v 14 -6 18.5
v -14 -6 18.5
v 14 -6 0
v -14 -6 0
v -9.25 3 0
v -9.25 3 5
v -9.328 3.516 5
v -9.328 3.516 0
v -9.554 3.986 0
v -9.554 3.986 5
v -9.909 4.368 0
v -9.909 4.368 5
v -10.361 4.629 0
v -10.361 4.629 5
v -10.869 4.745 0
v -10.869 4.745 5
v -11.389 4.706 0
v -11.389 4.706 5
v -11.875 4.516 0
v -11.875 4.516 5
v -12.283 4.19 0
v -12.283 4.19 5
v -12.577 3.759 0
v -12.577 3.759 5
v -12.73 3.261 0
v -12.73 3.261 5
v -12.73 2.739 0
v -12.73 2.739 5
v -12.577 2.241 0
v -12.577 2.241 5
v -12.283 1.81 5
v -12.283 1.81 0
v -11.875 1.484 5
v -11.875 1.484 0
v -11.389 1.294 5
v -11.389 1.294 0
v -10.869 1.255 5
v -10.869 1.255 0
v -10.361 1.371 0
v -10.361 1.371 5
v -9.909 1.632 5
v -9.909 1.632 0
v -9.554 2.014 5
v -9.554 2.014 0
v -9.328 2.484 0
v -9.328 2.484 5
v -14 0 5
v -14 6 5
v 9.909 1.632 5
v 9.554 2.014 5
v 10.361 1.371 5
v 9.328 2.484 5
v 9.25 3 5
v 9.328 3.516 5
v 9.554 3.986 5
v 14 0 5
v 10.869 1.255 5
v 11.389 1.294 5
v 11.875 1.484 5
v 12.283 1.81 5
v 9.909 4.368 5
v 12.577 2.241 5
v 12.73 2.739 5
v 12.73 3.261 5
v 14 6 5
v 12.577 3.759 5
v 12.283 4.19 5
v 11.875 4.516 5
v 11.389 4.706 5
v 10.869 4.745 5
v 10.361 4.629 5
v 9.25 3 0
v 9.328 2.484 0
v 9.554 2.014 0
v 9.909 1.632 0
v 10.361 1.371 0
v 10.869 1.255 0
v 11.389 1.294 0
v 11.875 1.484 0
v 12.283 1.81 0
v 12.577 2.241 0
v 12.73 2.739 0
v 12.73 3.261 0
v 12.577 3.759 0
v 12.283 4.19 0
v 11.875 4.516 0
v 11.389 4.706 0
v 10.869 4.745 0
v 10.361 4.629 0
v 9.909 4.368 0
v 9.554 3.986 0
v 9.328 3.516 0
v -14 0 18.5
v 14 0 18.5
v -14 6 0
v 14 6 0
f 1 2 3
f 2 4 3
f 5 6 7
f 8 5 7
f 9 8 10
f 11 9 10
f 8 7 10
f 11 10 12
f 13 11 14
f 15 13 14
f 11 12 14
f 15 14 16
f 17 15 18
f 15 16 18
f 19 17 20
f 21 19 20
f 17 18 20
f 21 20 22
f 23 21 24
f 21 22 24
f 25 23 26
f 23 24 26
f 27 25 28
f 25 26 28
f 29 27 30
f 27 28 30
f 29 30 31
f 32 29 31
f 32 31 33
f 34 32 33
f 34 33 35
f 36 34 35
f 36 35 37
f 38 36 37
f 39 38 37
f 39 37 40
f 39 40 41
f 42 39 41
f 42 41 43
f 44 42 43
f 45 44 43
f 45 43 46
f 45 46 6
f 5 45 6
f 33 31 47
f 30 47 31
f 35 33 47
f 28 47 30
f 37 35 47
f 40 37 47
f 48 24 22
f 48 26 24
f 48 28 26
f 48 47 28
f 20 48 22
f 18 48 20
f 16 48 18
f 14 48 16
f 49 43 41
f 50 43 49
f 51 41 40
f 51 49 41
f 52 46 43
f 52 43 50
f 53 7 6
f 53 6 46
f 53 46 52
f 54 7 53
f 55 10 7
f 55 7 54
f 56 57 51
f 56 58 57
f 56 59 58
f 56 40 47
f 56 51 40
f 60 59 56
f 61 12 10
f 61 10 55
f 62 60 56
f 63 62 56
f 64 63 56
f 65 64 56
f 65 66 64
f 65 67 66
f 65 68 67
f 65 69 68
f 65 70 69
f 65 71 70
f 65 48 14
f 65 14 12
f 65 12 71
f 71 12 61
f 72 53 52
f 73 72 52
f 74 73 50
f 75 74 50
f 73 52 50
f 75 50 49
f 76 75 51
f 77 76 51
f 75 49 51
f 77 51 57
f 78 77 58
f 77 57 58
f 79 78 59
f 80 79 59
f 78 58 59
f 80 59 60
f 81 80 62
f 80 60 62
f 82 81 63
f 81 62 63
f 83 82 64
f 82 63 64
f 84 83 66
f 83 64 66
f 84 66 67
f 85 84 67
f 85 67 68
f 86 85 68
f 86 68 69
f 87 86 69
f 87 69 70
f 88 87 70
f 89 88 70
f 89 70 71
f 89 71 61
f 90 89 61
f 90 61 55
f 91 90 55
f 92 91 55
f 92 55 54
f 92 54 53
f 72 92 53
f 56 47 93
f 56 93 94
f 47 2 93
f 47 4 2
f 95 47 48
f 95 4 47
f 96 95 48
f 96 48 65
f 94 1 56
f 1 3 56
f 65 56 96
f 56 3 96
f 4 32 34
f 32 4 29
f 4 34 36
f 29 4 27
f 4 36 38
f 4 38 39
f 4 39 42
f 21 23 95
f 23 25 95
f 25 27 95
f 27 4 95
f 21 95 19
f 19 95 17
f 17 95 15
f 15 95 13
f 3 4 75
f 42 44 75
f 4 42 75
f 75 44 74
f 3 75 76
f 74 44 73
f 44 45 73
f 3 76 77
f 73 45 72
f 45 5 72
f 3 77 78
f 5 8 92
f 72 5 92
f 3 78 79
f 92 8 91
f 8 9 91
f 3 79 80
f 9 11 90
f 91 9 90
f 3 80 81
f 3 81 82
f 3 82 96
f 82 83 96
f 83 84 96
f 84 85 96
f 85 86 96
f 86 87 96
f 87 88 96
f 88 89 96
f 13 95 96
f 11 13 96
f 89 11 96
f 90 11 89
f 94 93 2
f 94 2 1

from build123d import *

# Parameters (mm, degrees)
SKETCH1_W           = 28
SKETCH1_H           = 12
BOSS_EXTRUDE1_DEPTH = 5
SKETCH2_W           = 28
SKETCH2_H           = 6
BOSS_EXTRUDE2_DEPTH = 13.5
SKETCH3_R           = 1.75
CUT_EXTRUDE1_DEPTH  = 21.353132437


with BuildPart() as part:
    # Sketch1 → Boss-Extrude1 (new body)
    with BuildSketch(Plane.XY):
        Rectangle(SKETCH1_W, SKETCH1_H)
    extrude(amount=BOSS_EXTRUDE1_DEPTH)

    # Sketch2 → Boss-Extrude2 (add)
    with BuildSketch(Plane.XY.offset(5)):
        with Locations((0, -3)):
            Rectangle(SKETCH2_W, SKETCH2_H)
    extrude(amount=BOSS_EXTRUDE2_DEPTH)

    # Sketch3 → Cut-Extrude1 (cut, through all)
    with BuildSketch(Plane.XY.offset(5)):
        with Locations((-11, 3)):
            Circle(SKETCH3_R)
        with Locations(Location((11, 3, 0), (0, 0, 180))):
            Circle(SKETCH3_R)
    extrude(amount=-CUT_EXTRUDE1_DEPTH, mode=Mode.SUBTRACT)


solid = part.part
